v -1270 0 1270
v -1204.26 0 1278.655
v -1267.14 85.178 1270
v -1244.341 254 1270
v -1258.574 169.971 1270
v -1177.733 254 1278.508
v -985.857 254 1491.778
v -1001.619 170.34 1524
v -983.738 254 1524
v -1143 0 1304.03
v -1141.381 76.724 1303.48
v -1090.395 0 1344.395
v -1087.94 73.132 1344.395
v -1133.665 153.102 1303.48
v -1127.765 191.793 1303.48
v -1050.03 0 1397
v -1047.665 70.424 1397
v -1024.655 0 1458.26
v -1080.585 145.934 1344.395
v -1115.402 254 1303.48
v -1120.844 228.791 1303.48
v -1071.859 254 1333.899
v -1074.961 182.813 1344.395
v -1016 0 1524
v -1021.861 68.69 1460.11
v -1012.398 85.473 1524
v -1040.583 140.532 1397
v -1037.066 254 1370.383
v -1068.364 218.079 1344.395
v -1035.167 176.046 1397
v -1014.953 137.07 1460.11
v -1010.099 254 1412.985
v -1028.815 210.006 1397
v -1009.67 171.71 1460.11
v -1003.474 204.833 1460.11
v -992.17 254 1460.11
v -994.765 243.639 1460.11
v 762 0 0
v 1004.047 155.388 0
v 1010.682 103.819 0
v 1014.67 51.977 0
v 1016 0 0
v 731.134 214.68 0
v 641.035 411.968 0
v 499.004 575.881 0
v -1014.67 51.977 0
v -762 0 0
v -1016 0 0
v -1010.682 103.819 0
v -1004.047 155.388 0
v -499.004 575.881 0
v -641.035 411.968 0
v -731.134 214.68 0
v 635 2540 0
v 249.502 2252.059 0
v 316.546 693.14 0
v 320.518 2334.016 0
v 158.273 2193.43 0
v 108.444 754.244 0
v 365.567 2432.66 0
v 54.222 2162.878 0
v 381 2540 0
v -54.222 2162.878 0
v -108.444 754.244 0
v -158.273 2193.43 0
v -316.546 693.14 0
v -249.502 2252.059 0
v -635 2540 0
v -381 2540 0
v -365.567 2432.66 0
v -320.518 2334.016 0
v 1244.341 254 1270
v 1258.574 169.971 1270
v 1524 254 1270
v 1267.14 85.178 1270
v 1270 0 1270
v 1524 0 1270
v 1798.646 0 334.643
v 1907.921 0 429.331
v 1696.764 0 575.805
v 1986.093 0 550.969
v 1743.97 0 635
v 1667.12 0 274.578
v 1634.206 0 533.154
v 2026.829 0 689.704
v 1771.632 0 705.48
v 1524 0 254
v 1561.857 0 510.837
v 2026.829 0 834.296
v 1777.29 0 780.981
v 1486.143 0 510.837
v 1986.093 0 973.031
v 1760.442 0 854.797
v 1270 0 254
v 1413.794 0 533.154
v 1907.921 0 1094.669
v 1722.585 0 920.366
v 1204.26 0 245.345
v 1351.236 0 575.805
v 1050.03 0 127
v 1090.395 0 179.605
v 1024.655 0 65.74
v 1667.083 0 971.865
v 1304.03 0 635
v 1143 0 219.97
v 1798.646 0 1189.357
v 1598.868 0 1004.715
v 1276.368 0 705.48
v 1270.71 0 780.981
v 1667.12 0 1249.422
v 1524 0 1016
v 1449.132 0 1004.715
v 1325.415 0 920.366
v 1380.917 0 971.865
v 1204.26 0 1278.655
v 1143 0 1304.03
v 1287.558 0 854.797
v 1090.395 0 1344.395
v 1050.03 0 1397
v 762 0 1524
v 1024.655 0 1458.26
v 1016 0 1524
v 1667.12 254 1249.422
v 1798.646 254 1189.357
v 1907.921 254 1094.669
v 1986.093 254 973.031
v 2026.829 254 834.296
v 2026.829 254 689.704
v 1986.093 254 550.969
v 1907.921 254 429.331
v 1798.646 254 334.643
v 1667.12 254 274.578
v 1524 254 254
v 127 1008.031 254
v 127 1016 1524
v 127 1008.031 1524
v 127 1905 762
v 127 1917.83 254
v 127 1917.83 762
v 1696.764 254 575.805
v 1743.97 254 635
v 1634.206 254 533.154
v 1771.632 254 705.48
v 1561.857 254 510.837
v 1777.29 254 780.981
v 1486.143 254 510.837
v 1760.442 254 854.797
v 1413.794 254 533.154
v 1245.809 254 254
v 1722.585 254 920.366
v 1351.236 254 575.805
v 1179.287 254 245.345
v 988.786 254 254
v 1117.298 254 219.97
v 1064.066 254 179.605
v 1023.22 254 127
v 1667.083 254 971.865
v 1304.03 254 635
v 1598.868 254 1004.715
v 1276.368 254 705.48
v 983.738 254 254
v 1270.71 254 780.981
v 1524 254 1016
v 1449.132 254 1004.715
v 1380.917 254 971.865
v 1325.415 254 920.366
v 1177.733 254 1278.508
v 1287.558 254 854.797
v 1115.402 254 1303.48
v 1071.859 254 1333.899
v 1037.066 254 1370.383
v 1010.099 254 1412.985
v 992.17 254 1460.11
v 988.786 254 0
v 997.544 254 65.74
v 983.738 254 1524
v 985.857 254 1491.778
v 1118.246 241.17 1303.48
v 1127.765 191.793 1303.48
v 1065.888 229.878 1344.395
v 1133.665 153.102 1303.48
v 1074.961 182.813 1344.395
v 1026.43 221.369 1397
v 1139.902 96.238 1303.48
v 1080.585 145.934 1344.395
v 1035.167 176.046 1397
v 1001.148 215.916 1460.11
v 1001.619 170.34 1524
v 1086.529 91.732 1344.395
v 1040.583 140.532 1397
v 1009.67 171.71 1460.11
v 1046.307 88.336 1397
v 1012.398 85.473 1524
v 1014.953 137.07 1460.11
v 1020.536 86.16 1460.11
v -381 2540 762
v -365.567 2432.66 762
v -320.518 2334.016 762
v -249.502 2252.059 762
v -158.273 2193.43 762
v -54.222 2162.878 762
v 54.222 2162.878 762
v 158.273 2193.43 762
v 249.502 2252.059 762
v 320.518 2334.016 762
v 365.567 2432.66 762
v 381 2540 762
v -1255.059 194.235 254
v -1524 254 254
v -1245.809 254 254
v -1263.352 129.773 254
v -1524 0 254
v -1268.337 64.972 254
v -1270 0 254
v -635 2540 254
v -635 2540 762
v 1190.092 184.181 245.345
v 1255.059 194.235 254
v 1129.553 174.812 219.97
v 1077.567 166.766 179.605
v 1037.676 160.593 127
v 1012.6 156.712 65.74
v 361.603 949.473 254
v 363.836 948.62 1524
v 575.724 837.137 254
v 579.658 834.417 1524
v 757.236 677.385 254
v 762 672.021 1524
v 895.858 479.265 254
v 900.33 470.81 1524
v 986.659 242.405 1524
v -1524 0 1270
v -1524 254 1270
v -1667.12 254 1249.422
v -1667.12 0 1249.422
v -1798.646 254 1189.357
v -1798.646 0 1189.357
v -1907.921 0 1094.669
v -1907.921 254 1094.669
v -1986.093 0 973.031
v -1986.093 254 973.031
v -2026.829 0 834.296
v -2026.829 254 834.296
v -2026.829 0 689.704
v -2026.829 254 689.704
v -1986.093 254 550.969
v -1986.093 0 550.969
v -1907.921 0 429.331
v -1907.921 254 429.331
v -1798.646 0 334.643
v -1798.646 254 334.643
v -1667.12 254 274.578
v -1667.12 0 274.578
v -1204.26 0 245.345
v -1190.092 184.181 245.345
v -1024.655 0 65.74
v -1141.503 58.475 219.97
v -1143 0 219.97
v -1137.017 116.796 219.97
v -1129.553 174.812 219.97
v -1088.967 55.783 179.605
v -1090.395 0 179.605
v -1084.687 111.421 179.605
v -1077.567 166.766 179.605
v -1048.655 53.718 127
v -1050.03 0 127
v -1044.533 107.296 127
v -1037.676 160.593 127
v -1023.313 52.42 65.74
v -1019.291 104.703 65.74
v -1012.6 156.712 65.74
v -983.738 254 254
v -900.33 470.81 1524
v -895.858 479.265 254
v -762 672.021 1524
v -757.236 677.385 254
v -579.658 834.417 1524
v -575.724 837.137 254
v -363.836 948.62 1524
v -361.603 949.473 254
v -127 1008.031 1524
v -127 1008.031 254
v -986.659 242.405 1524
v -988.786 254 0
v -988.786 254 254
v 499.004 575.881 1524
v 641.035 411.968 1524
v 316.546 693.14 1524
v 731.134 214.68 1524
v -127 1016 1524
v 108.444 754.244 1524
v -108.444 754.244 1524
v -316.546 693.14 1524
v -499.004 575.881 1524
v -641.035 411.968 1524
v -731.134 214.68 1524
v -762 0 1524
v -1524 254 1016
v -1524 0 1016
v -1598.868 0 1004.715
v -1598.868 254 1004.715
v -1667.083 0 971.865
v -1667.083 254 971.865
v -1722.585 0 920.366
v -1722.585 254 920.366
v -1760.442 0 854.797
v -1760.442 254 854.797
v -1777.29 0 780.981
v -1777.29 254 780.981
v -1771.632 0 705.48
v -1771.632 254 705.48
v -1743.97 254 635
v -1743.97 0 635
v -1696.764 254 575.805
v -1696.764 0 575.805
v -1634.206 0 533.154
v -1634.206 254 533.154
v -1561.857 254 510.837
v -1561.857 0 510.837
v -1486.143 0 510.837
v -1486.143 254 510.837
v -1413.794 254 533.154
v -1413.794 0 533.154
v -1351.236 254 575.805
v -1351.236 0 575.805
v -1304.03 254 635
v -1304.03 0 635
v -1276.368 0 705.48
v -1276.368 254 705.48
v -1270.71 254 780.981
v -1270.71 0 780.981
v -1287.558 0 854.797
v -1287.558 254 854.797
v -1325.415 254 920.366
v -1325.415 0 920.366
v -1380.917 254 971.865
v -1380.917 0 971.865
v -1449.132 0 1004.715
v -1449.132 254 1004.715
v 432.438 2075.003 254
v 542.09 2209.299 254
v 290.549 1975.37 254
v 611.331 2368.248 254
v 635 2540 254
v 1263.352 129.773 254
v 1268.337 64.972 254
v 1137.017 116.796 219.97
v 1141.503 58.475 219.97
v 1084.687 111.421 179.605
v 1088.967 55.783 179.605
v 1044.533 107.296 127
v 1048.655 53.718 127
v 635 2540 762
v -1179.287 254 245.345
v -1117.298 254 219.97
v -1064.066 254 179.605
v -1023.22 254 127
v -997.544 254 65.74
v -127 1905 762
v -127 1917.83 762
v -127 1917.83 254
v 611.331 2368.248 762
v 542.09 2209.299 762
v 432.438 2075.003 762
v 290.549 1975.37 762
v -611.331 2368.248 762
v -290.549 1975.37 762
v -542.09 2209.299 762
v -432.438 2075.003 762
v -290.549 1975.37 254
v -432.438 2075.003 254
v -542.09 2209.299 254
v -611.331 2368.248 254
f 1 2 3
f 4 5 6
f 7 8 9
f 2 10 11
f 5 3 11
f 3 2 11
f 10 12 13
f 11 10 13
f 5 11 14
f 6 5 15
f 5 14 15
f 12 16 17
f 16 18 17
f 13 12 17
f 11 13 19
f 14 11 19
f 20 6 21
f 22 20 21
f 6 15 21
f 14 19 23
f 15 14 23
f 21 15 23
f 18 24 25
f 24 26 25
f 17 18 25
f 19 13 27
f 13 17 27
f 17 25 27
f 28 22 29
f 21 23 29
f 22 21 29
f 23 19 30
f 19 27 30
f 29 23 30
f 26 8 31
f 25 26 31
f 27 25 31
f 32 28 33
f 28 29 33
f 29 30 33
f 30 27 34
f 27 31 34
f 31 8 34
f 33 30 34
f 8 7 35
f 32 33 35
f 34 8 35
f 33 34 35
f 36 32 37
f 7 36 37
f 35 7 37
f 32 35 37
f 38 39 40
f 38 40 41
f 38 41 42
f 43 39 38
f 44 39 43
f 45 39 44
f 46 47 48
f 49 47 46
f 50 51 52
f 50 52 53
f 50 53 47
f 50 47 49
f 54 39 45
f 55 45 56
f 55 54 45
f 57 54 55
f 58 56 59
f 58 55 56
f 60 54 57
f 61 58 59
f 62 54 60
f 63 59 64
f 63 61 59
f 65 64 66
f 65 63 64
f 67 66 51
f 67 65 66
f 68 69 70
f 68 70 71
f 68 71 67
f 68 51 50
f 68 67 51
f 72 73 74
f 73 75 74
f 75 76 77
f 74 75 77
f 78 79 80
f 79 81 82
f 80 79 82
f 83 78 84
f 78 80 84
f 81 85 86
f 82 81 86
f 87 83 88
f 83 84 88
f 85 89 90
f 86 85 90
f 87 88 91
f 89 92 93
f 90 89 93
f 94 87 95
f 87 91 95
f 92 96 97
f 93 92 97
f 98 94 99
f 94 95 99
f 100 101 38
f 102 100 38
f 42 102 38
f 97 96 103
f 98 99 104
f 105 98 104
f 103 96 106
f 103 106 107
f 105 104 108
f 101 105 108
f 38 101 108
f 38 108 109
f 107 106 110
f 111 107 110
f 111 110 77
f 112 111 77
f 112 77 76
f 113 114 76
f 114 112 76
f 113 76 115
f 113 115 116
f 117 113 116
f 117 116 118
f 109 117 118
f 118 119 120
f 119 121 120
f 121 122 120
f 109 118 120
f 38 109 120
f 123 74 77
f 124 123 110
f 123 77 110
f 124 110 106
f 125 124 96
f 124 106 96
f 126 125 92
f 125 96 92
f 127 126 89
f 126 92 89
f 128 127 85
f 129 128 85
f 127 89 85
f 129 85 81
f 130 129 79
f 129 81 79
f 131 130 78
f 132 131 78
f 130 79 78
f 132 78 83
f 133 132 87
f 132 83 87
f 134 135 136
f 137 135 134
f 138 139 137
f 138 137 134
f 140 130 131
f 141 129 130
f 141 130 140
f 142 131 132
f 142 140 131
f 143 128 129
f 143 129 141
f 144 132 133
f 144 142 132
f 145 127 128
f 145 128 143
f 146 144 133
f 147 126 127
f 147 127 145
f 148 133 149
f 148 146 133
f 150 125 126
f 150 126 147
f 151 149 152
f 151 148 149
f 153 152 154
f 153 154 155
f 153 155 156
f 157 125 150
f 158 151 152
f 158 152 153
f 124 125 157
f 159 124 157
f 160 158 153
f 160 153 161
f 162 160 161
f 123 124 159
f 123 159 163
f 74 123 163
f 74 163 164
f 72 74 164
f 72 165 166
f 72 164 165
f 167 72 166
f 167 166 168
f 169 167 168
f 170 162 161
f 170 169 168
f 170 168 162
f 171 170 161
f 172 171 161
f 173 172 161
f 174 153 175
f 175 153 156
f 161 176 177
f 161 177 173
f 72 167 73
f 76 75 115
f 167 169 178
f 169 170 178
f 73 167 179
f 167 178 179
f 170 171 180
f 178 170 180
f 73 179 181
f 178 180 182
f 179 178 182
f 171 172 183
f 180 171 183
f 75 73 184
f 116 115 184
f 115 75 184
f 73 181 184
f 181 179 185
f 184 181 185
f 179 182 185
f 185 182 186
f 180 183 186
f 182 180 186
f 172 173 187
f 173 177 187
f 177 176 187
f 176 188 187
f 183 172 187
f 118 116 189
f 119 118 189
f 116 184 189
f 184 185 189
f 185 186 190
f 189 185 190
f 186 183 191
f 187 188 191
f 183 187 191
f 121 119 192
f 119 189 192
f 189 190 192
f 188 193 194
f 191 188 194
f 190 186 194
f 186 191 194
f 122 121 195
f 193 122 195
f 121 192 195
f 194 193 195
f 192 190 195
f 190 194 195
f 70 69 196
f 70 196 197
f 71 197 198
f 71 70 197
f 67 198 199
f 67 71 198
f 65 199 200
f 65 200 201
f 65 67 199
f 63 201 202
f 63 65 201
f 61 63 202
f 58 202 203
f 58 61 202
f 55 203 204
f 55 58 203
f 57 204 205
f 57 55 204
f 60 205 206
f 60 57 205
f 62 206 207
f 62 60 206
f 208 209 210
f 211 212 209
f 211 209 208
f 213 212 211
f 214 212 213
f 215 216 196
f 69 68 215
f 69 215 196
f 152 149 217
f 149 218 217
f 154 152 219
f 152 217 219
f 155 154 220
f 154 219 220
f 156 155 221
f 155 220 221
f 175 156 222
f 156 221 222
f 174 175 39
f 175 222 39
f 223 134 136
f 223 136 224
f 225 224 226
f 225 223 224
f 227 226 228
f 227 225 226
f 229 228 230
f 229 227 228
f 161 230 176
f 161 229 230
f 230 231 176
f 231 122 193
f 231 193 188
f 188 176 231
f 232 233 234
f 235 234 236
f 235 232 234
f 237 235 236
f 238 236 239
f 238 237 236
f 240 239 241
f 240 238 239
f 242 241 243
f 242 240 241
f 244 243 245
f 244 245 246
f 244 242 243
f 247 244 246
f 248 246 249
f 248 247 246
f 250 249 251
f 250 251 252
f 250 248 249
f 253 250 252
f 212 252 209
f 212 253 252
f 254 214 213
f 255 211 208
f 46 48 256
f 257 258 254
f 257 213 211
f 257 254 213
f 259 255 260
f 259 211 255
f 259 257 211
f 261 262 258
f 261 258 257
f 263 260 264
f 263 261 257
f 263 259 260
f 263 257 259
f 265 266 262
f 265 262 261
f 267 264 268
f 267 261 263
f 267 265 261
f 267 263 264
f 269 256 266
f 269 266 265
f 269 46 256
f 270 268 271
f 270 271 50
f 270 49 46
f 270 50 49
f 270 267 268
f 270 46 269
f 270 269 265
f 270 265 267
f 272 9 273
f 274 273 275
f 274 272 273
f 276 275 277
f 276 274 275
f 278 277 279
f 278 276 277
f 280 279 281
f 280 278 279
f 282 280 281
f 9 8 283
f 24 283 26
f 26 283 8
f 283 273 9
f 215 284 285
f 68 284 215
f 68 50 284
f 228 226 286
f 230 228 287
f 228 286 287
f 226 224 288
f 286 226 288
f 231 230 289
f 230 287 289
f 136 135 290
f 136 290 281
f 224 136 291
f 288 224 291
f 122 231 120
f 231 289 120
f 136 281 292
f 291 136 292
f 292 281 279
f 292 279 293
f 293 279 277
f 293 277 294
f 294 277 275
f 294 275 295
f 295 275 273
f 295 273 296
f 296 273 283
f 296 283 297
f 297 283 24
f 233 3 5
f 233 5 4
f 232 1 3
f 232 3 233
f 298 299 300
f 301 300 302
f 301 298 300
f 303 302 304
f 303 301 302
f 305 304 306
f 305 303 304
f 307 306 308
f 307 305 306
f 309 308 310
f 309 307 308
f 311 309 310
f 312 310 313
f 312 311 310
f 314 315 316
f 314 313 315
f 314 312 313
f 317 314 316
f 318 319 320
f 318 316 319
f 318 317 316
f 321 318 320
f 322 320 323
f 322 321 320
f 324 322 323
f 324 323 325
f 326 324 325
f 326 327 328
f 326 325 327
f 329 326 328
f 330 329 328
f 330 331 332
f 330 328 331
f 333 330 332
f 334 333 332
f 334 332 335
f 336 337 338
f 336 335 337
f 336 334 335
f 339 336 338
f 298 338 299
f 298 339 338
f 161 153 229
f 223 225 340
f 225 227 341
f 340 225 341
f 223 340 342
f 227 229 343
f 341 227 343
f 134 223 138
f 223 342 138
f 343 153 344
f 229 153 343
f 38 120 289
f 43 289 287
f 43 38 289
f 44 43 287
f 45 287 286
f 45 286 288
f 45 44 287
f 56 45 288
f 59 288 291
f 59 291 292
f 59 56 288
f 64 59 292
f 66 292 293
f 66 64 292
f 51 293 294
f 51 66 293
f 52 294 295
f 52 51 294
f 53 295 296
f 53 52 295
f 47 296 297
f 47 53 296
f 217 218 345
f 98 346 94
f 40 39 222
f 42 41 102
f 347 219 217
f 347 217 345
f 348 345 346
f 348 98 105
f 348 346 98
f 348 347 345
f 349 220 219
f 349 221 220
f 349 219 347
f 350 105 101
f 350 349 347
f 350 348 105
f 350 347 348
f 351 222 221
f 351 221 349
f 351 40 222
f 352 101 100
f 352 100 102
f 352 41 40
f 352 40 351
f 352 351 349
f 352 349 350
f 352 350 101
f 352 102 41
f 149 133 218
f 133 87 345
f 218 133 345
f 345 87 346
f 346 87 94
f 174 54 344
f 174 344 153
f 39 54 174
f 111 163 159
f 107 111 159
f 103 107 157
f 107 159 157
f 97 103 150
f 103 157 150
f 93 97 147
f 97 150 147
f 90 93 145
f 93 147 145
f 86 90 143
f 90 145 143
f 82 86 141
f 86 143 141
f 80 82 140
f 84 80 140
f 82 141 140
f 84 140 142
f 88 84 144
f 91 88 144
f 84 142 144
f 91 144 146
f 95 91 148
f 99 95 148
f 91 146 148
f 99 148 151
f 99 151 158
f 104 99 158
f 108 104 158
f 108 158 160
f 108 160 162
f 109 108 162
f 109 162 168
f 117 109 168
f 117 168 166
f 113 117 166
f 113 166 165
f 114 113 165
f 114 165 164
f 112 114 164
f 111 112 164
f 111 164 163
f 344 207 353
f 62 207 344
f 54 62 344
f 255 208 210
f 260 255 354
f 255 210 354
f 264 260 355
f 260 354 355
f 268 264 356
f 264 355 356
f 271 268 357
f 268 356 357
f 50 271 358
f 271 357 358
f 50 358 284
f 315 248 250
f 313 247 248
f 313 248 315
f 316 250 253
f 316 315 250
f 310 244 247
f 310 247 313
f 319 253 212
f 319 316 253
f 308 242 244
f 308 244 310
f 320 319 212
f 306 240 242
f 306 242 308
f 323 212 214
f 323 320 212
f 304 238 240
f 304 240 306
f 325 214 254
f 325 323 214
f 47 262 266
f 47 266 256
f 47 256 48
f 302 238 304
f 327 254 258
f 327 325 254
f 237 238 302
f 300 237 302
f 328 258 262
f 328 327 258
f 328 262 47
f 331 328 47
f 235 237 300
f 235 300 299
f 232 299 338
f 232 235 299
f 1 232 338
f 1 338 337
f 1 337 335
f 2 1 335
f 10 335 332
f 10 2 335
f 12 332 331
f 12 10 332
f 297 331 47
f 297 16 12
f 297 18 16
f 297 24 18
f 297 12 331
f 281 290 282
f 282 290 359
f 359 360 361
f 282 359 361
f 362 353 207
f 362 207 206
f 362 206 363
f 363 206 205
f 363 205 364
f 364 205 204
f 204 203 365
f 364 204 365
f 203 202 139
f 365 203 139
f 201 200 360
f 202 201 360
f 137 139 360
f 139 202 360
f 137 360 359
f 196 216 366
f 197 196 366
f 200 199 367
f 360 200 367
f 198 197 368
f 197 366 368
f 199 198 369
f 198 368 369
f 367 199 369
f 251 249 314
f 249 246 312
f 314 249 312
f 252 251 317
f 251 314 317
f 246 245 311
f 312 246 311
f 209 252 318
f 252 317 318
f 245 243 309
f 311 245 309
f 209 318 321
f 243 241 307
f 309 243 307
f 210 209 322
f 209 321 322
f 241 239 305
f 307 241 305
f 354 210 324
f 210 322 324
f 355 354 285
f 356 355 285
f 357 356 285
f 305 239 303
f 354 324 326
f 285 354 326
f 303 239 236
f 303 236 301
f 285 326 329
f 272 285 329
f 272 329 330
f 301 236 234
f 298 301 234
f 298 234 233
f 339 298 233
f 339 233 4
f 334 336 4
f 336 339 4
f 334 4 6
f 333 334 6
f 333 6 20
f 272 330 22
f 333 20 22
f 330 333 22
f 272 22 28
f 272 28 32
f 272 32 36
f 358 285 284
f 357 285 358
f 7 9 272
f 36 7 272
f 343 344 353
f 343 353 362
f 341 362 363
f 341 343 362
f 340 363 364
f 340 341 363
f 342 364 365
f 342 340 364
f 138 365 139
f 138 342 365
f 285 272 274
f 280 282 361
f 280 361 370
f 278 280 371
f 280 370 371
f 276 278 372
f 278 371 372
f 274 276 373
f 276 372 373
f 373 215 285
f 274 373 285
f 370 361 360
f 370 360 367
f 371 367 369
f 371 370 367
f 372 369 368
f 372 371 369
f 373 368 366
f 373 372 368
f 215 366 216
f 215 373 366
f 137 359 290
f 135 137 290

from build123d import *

# Parameters (mm, degrees)
BOSS_EXTRUDE2_DEPTH  = 1524
BOSS_EXTRUDE3_DEPTH  = 762
BOSS_EXTRUDE4_DEPTH  = 254
BOSS_EXTRUDE5_DEPTH  = 254
SKETCH5_R            = 254
CUT_EXTRUDE1_DEPTH   = 3418.220507957
FILLET1_R            = 254
FILLET1_OF_MIRROR1_R = 254
RIB3_START           = -127
RIB3_DEPTH           = 254


with BuildPart() as part:
    # Sketch1 → Boss-Extrude2 (new body)
    with BuildSketch(Plane.XY):
        with BuildLine():
            Line((1016, 0), (762, 0))
            ThreePointArc((762, 0), (0, 762), (-762, 0))
            Line((-762, 0), (-1016, 0))
            ThreePointArc((-1016, 0), (0, 1016), (1016, 0))
        make_face()
    extrude(amount=BOSS_EXTRUDE2_DEPTH)



with BuildPart() as body_2:
    # Sketch1<6> → Boss-Extrude3 (new body)
    with BuildSketch(Plane.XY):
        with BuildLine():
            Line((-635, 2540), (-381, 2540))
            ThreePointArc((-381, 2540), (0, 2159), (381, 2540))
            Line((381, 2540), (635, 2540))
            ThreePointArc((635, 2540), (0, 1905), (-635, 2540))
        make_face()
    extrude(amount=BOSS_EXTRUDE3_DEPTH)


with BuildPart() as part_1:
    add(part.part)

    add(body_2.part)  # Boss-Extrude4 merges body 2
    # Sketch2 → Boss-Extrude4 (add)
    with BuildSketch(Plane(origin=(0, 0, 0), x_dir=(-1, 0, 0), z_dir=(0, 0, -1))):
        with BuildLine():
            Line((-635, 2540), (-1004.047058824, 155.388235294))
            ThreePointArc((-1004.047058824, 155.388235294), (0, 1016), (1004.047058824, 155.388235294))
            Line((1004.047058824, 155.388235294), (635, 2540))
            ThreePointArc((635, 2540), (0, 1905), (-635, 2540))
        make_face()
    extrude(amount=-BOSS_EXTRUDE4_DEPTH)

    # Sketch3 → Boss-Extrude5 (add)
    with BuildSketch(Plane.XZ):
        with BuildLine():
            Line((1524, 254), (908.235803169, 254))
            Line((908.235803169, 254), (908.235803169, 1270))
            Line((908.235803169, 1270), (1524, 1270))
            ThreePointArc((1524, 1270), (2032, 762), (1524, 254))
        make_face()
    boss_extrude5 = extrude(amount=-BOSS_EXTRUDE5_DEPTH)

    # Sketch5 → Cut-Extrude1 (cut, through all)
    with BuildSketch(Plane(origin=(0, 254, 0), x_dir=(1, 0, 0), z_dir=(0, 1, 0))):
        with Locations(Location((1524, -762, 0), (0, 0, 270))):
            Circle(SKETCH5_R)
    cut_extrude1 = extrude(amount=-CUT_EXTRUDE1_DEPTH, mode=Mode.SUBTRACT)

    # Fillet1
    fillet1_edges = [part_1.edges().sort_by_distance(p)[0] for p in [
        (996.416386555, 204.694117647, 254),
        (1013.00735727, 77.923642867, 254),
        (1007.902171407, 128.020361162, 1270),
    ]]
    fillet(fillet1_edges, radius=FILLET1_R - 0.0001)  # a hair under: the kernel refuses the full size

    # Mirror1: Boss-Extrude5, Cut-Extrude1 across plane
    add(boss_extrude5.mirror(Plane(origin=(0, 0, 0), x_dir=(0, 0, 1), z_dir=(1, 0, 0))))
    add(cut_extrude1.mirror(Plane(origin=(0, 0, 0), x_dir=(0, 0, 1), z_dir=(1, 0, 0))), mode=Mode.SUBTRACT)

    # Fillet1 of Mirror1
    fillet1_of_mirror1_edges = [part_1.edges().sort_by_distance(p)[0] for p in [
        (-996.416386555, 204.694117647, 254),
        (-1013.00735727, 77.923642867, 254),
        (-1007.902171407, 128.020361162, 1270),
    ]]
    fillet(fillet1_of_mirror1_edges, radius=FILLET1_OF_MIRROR1_R - 0.0001)  # a hair under: the kernel refuses the full size

    # Rib3: read off the stored shape, not the designer's step
    # Rib3 outline → Rib3 (add)
    with BuildSketch(Plane(origin=(0, 0, 0), x_dir=(0, 0, -1), z_dir=(1, 0, 0)).offset(RIB3_START)):
        Polygon((-1524, 1016), (-1524, 1008.031249516), (-254, 1008.031249516), (-254, 1917.829605333), (-762, 1917.829605333), (-762, 1905), align=None)
    extrude(amount=RIB3_DEPTH)


solid = part_1.part
